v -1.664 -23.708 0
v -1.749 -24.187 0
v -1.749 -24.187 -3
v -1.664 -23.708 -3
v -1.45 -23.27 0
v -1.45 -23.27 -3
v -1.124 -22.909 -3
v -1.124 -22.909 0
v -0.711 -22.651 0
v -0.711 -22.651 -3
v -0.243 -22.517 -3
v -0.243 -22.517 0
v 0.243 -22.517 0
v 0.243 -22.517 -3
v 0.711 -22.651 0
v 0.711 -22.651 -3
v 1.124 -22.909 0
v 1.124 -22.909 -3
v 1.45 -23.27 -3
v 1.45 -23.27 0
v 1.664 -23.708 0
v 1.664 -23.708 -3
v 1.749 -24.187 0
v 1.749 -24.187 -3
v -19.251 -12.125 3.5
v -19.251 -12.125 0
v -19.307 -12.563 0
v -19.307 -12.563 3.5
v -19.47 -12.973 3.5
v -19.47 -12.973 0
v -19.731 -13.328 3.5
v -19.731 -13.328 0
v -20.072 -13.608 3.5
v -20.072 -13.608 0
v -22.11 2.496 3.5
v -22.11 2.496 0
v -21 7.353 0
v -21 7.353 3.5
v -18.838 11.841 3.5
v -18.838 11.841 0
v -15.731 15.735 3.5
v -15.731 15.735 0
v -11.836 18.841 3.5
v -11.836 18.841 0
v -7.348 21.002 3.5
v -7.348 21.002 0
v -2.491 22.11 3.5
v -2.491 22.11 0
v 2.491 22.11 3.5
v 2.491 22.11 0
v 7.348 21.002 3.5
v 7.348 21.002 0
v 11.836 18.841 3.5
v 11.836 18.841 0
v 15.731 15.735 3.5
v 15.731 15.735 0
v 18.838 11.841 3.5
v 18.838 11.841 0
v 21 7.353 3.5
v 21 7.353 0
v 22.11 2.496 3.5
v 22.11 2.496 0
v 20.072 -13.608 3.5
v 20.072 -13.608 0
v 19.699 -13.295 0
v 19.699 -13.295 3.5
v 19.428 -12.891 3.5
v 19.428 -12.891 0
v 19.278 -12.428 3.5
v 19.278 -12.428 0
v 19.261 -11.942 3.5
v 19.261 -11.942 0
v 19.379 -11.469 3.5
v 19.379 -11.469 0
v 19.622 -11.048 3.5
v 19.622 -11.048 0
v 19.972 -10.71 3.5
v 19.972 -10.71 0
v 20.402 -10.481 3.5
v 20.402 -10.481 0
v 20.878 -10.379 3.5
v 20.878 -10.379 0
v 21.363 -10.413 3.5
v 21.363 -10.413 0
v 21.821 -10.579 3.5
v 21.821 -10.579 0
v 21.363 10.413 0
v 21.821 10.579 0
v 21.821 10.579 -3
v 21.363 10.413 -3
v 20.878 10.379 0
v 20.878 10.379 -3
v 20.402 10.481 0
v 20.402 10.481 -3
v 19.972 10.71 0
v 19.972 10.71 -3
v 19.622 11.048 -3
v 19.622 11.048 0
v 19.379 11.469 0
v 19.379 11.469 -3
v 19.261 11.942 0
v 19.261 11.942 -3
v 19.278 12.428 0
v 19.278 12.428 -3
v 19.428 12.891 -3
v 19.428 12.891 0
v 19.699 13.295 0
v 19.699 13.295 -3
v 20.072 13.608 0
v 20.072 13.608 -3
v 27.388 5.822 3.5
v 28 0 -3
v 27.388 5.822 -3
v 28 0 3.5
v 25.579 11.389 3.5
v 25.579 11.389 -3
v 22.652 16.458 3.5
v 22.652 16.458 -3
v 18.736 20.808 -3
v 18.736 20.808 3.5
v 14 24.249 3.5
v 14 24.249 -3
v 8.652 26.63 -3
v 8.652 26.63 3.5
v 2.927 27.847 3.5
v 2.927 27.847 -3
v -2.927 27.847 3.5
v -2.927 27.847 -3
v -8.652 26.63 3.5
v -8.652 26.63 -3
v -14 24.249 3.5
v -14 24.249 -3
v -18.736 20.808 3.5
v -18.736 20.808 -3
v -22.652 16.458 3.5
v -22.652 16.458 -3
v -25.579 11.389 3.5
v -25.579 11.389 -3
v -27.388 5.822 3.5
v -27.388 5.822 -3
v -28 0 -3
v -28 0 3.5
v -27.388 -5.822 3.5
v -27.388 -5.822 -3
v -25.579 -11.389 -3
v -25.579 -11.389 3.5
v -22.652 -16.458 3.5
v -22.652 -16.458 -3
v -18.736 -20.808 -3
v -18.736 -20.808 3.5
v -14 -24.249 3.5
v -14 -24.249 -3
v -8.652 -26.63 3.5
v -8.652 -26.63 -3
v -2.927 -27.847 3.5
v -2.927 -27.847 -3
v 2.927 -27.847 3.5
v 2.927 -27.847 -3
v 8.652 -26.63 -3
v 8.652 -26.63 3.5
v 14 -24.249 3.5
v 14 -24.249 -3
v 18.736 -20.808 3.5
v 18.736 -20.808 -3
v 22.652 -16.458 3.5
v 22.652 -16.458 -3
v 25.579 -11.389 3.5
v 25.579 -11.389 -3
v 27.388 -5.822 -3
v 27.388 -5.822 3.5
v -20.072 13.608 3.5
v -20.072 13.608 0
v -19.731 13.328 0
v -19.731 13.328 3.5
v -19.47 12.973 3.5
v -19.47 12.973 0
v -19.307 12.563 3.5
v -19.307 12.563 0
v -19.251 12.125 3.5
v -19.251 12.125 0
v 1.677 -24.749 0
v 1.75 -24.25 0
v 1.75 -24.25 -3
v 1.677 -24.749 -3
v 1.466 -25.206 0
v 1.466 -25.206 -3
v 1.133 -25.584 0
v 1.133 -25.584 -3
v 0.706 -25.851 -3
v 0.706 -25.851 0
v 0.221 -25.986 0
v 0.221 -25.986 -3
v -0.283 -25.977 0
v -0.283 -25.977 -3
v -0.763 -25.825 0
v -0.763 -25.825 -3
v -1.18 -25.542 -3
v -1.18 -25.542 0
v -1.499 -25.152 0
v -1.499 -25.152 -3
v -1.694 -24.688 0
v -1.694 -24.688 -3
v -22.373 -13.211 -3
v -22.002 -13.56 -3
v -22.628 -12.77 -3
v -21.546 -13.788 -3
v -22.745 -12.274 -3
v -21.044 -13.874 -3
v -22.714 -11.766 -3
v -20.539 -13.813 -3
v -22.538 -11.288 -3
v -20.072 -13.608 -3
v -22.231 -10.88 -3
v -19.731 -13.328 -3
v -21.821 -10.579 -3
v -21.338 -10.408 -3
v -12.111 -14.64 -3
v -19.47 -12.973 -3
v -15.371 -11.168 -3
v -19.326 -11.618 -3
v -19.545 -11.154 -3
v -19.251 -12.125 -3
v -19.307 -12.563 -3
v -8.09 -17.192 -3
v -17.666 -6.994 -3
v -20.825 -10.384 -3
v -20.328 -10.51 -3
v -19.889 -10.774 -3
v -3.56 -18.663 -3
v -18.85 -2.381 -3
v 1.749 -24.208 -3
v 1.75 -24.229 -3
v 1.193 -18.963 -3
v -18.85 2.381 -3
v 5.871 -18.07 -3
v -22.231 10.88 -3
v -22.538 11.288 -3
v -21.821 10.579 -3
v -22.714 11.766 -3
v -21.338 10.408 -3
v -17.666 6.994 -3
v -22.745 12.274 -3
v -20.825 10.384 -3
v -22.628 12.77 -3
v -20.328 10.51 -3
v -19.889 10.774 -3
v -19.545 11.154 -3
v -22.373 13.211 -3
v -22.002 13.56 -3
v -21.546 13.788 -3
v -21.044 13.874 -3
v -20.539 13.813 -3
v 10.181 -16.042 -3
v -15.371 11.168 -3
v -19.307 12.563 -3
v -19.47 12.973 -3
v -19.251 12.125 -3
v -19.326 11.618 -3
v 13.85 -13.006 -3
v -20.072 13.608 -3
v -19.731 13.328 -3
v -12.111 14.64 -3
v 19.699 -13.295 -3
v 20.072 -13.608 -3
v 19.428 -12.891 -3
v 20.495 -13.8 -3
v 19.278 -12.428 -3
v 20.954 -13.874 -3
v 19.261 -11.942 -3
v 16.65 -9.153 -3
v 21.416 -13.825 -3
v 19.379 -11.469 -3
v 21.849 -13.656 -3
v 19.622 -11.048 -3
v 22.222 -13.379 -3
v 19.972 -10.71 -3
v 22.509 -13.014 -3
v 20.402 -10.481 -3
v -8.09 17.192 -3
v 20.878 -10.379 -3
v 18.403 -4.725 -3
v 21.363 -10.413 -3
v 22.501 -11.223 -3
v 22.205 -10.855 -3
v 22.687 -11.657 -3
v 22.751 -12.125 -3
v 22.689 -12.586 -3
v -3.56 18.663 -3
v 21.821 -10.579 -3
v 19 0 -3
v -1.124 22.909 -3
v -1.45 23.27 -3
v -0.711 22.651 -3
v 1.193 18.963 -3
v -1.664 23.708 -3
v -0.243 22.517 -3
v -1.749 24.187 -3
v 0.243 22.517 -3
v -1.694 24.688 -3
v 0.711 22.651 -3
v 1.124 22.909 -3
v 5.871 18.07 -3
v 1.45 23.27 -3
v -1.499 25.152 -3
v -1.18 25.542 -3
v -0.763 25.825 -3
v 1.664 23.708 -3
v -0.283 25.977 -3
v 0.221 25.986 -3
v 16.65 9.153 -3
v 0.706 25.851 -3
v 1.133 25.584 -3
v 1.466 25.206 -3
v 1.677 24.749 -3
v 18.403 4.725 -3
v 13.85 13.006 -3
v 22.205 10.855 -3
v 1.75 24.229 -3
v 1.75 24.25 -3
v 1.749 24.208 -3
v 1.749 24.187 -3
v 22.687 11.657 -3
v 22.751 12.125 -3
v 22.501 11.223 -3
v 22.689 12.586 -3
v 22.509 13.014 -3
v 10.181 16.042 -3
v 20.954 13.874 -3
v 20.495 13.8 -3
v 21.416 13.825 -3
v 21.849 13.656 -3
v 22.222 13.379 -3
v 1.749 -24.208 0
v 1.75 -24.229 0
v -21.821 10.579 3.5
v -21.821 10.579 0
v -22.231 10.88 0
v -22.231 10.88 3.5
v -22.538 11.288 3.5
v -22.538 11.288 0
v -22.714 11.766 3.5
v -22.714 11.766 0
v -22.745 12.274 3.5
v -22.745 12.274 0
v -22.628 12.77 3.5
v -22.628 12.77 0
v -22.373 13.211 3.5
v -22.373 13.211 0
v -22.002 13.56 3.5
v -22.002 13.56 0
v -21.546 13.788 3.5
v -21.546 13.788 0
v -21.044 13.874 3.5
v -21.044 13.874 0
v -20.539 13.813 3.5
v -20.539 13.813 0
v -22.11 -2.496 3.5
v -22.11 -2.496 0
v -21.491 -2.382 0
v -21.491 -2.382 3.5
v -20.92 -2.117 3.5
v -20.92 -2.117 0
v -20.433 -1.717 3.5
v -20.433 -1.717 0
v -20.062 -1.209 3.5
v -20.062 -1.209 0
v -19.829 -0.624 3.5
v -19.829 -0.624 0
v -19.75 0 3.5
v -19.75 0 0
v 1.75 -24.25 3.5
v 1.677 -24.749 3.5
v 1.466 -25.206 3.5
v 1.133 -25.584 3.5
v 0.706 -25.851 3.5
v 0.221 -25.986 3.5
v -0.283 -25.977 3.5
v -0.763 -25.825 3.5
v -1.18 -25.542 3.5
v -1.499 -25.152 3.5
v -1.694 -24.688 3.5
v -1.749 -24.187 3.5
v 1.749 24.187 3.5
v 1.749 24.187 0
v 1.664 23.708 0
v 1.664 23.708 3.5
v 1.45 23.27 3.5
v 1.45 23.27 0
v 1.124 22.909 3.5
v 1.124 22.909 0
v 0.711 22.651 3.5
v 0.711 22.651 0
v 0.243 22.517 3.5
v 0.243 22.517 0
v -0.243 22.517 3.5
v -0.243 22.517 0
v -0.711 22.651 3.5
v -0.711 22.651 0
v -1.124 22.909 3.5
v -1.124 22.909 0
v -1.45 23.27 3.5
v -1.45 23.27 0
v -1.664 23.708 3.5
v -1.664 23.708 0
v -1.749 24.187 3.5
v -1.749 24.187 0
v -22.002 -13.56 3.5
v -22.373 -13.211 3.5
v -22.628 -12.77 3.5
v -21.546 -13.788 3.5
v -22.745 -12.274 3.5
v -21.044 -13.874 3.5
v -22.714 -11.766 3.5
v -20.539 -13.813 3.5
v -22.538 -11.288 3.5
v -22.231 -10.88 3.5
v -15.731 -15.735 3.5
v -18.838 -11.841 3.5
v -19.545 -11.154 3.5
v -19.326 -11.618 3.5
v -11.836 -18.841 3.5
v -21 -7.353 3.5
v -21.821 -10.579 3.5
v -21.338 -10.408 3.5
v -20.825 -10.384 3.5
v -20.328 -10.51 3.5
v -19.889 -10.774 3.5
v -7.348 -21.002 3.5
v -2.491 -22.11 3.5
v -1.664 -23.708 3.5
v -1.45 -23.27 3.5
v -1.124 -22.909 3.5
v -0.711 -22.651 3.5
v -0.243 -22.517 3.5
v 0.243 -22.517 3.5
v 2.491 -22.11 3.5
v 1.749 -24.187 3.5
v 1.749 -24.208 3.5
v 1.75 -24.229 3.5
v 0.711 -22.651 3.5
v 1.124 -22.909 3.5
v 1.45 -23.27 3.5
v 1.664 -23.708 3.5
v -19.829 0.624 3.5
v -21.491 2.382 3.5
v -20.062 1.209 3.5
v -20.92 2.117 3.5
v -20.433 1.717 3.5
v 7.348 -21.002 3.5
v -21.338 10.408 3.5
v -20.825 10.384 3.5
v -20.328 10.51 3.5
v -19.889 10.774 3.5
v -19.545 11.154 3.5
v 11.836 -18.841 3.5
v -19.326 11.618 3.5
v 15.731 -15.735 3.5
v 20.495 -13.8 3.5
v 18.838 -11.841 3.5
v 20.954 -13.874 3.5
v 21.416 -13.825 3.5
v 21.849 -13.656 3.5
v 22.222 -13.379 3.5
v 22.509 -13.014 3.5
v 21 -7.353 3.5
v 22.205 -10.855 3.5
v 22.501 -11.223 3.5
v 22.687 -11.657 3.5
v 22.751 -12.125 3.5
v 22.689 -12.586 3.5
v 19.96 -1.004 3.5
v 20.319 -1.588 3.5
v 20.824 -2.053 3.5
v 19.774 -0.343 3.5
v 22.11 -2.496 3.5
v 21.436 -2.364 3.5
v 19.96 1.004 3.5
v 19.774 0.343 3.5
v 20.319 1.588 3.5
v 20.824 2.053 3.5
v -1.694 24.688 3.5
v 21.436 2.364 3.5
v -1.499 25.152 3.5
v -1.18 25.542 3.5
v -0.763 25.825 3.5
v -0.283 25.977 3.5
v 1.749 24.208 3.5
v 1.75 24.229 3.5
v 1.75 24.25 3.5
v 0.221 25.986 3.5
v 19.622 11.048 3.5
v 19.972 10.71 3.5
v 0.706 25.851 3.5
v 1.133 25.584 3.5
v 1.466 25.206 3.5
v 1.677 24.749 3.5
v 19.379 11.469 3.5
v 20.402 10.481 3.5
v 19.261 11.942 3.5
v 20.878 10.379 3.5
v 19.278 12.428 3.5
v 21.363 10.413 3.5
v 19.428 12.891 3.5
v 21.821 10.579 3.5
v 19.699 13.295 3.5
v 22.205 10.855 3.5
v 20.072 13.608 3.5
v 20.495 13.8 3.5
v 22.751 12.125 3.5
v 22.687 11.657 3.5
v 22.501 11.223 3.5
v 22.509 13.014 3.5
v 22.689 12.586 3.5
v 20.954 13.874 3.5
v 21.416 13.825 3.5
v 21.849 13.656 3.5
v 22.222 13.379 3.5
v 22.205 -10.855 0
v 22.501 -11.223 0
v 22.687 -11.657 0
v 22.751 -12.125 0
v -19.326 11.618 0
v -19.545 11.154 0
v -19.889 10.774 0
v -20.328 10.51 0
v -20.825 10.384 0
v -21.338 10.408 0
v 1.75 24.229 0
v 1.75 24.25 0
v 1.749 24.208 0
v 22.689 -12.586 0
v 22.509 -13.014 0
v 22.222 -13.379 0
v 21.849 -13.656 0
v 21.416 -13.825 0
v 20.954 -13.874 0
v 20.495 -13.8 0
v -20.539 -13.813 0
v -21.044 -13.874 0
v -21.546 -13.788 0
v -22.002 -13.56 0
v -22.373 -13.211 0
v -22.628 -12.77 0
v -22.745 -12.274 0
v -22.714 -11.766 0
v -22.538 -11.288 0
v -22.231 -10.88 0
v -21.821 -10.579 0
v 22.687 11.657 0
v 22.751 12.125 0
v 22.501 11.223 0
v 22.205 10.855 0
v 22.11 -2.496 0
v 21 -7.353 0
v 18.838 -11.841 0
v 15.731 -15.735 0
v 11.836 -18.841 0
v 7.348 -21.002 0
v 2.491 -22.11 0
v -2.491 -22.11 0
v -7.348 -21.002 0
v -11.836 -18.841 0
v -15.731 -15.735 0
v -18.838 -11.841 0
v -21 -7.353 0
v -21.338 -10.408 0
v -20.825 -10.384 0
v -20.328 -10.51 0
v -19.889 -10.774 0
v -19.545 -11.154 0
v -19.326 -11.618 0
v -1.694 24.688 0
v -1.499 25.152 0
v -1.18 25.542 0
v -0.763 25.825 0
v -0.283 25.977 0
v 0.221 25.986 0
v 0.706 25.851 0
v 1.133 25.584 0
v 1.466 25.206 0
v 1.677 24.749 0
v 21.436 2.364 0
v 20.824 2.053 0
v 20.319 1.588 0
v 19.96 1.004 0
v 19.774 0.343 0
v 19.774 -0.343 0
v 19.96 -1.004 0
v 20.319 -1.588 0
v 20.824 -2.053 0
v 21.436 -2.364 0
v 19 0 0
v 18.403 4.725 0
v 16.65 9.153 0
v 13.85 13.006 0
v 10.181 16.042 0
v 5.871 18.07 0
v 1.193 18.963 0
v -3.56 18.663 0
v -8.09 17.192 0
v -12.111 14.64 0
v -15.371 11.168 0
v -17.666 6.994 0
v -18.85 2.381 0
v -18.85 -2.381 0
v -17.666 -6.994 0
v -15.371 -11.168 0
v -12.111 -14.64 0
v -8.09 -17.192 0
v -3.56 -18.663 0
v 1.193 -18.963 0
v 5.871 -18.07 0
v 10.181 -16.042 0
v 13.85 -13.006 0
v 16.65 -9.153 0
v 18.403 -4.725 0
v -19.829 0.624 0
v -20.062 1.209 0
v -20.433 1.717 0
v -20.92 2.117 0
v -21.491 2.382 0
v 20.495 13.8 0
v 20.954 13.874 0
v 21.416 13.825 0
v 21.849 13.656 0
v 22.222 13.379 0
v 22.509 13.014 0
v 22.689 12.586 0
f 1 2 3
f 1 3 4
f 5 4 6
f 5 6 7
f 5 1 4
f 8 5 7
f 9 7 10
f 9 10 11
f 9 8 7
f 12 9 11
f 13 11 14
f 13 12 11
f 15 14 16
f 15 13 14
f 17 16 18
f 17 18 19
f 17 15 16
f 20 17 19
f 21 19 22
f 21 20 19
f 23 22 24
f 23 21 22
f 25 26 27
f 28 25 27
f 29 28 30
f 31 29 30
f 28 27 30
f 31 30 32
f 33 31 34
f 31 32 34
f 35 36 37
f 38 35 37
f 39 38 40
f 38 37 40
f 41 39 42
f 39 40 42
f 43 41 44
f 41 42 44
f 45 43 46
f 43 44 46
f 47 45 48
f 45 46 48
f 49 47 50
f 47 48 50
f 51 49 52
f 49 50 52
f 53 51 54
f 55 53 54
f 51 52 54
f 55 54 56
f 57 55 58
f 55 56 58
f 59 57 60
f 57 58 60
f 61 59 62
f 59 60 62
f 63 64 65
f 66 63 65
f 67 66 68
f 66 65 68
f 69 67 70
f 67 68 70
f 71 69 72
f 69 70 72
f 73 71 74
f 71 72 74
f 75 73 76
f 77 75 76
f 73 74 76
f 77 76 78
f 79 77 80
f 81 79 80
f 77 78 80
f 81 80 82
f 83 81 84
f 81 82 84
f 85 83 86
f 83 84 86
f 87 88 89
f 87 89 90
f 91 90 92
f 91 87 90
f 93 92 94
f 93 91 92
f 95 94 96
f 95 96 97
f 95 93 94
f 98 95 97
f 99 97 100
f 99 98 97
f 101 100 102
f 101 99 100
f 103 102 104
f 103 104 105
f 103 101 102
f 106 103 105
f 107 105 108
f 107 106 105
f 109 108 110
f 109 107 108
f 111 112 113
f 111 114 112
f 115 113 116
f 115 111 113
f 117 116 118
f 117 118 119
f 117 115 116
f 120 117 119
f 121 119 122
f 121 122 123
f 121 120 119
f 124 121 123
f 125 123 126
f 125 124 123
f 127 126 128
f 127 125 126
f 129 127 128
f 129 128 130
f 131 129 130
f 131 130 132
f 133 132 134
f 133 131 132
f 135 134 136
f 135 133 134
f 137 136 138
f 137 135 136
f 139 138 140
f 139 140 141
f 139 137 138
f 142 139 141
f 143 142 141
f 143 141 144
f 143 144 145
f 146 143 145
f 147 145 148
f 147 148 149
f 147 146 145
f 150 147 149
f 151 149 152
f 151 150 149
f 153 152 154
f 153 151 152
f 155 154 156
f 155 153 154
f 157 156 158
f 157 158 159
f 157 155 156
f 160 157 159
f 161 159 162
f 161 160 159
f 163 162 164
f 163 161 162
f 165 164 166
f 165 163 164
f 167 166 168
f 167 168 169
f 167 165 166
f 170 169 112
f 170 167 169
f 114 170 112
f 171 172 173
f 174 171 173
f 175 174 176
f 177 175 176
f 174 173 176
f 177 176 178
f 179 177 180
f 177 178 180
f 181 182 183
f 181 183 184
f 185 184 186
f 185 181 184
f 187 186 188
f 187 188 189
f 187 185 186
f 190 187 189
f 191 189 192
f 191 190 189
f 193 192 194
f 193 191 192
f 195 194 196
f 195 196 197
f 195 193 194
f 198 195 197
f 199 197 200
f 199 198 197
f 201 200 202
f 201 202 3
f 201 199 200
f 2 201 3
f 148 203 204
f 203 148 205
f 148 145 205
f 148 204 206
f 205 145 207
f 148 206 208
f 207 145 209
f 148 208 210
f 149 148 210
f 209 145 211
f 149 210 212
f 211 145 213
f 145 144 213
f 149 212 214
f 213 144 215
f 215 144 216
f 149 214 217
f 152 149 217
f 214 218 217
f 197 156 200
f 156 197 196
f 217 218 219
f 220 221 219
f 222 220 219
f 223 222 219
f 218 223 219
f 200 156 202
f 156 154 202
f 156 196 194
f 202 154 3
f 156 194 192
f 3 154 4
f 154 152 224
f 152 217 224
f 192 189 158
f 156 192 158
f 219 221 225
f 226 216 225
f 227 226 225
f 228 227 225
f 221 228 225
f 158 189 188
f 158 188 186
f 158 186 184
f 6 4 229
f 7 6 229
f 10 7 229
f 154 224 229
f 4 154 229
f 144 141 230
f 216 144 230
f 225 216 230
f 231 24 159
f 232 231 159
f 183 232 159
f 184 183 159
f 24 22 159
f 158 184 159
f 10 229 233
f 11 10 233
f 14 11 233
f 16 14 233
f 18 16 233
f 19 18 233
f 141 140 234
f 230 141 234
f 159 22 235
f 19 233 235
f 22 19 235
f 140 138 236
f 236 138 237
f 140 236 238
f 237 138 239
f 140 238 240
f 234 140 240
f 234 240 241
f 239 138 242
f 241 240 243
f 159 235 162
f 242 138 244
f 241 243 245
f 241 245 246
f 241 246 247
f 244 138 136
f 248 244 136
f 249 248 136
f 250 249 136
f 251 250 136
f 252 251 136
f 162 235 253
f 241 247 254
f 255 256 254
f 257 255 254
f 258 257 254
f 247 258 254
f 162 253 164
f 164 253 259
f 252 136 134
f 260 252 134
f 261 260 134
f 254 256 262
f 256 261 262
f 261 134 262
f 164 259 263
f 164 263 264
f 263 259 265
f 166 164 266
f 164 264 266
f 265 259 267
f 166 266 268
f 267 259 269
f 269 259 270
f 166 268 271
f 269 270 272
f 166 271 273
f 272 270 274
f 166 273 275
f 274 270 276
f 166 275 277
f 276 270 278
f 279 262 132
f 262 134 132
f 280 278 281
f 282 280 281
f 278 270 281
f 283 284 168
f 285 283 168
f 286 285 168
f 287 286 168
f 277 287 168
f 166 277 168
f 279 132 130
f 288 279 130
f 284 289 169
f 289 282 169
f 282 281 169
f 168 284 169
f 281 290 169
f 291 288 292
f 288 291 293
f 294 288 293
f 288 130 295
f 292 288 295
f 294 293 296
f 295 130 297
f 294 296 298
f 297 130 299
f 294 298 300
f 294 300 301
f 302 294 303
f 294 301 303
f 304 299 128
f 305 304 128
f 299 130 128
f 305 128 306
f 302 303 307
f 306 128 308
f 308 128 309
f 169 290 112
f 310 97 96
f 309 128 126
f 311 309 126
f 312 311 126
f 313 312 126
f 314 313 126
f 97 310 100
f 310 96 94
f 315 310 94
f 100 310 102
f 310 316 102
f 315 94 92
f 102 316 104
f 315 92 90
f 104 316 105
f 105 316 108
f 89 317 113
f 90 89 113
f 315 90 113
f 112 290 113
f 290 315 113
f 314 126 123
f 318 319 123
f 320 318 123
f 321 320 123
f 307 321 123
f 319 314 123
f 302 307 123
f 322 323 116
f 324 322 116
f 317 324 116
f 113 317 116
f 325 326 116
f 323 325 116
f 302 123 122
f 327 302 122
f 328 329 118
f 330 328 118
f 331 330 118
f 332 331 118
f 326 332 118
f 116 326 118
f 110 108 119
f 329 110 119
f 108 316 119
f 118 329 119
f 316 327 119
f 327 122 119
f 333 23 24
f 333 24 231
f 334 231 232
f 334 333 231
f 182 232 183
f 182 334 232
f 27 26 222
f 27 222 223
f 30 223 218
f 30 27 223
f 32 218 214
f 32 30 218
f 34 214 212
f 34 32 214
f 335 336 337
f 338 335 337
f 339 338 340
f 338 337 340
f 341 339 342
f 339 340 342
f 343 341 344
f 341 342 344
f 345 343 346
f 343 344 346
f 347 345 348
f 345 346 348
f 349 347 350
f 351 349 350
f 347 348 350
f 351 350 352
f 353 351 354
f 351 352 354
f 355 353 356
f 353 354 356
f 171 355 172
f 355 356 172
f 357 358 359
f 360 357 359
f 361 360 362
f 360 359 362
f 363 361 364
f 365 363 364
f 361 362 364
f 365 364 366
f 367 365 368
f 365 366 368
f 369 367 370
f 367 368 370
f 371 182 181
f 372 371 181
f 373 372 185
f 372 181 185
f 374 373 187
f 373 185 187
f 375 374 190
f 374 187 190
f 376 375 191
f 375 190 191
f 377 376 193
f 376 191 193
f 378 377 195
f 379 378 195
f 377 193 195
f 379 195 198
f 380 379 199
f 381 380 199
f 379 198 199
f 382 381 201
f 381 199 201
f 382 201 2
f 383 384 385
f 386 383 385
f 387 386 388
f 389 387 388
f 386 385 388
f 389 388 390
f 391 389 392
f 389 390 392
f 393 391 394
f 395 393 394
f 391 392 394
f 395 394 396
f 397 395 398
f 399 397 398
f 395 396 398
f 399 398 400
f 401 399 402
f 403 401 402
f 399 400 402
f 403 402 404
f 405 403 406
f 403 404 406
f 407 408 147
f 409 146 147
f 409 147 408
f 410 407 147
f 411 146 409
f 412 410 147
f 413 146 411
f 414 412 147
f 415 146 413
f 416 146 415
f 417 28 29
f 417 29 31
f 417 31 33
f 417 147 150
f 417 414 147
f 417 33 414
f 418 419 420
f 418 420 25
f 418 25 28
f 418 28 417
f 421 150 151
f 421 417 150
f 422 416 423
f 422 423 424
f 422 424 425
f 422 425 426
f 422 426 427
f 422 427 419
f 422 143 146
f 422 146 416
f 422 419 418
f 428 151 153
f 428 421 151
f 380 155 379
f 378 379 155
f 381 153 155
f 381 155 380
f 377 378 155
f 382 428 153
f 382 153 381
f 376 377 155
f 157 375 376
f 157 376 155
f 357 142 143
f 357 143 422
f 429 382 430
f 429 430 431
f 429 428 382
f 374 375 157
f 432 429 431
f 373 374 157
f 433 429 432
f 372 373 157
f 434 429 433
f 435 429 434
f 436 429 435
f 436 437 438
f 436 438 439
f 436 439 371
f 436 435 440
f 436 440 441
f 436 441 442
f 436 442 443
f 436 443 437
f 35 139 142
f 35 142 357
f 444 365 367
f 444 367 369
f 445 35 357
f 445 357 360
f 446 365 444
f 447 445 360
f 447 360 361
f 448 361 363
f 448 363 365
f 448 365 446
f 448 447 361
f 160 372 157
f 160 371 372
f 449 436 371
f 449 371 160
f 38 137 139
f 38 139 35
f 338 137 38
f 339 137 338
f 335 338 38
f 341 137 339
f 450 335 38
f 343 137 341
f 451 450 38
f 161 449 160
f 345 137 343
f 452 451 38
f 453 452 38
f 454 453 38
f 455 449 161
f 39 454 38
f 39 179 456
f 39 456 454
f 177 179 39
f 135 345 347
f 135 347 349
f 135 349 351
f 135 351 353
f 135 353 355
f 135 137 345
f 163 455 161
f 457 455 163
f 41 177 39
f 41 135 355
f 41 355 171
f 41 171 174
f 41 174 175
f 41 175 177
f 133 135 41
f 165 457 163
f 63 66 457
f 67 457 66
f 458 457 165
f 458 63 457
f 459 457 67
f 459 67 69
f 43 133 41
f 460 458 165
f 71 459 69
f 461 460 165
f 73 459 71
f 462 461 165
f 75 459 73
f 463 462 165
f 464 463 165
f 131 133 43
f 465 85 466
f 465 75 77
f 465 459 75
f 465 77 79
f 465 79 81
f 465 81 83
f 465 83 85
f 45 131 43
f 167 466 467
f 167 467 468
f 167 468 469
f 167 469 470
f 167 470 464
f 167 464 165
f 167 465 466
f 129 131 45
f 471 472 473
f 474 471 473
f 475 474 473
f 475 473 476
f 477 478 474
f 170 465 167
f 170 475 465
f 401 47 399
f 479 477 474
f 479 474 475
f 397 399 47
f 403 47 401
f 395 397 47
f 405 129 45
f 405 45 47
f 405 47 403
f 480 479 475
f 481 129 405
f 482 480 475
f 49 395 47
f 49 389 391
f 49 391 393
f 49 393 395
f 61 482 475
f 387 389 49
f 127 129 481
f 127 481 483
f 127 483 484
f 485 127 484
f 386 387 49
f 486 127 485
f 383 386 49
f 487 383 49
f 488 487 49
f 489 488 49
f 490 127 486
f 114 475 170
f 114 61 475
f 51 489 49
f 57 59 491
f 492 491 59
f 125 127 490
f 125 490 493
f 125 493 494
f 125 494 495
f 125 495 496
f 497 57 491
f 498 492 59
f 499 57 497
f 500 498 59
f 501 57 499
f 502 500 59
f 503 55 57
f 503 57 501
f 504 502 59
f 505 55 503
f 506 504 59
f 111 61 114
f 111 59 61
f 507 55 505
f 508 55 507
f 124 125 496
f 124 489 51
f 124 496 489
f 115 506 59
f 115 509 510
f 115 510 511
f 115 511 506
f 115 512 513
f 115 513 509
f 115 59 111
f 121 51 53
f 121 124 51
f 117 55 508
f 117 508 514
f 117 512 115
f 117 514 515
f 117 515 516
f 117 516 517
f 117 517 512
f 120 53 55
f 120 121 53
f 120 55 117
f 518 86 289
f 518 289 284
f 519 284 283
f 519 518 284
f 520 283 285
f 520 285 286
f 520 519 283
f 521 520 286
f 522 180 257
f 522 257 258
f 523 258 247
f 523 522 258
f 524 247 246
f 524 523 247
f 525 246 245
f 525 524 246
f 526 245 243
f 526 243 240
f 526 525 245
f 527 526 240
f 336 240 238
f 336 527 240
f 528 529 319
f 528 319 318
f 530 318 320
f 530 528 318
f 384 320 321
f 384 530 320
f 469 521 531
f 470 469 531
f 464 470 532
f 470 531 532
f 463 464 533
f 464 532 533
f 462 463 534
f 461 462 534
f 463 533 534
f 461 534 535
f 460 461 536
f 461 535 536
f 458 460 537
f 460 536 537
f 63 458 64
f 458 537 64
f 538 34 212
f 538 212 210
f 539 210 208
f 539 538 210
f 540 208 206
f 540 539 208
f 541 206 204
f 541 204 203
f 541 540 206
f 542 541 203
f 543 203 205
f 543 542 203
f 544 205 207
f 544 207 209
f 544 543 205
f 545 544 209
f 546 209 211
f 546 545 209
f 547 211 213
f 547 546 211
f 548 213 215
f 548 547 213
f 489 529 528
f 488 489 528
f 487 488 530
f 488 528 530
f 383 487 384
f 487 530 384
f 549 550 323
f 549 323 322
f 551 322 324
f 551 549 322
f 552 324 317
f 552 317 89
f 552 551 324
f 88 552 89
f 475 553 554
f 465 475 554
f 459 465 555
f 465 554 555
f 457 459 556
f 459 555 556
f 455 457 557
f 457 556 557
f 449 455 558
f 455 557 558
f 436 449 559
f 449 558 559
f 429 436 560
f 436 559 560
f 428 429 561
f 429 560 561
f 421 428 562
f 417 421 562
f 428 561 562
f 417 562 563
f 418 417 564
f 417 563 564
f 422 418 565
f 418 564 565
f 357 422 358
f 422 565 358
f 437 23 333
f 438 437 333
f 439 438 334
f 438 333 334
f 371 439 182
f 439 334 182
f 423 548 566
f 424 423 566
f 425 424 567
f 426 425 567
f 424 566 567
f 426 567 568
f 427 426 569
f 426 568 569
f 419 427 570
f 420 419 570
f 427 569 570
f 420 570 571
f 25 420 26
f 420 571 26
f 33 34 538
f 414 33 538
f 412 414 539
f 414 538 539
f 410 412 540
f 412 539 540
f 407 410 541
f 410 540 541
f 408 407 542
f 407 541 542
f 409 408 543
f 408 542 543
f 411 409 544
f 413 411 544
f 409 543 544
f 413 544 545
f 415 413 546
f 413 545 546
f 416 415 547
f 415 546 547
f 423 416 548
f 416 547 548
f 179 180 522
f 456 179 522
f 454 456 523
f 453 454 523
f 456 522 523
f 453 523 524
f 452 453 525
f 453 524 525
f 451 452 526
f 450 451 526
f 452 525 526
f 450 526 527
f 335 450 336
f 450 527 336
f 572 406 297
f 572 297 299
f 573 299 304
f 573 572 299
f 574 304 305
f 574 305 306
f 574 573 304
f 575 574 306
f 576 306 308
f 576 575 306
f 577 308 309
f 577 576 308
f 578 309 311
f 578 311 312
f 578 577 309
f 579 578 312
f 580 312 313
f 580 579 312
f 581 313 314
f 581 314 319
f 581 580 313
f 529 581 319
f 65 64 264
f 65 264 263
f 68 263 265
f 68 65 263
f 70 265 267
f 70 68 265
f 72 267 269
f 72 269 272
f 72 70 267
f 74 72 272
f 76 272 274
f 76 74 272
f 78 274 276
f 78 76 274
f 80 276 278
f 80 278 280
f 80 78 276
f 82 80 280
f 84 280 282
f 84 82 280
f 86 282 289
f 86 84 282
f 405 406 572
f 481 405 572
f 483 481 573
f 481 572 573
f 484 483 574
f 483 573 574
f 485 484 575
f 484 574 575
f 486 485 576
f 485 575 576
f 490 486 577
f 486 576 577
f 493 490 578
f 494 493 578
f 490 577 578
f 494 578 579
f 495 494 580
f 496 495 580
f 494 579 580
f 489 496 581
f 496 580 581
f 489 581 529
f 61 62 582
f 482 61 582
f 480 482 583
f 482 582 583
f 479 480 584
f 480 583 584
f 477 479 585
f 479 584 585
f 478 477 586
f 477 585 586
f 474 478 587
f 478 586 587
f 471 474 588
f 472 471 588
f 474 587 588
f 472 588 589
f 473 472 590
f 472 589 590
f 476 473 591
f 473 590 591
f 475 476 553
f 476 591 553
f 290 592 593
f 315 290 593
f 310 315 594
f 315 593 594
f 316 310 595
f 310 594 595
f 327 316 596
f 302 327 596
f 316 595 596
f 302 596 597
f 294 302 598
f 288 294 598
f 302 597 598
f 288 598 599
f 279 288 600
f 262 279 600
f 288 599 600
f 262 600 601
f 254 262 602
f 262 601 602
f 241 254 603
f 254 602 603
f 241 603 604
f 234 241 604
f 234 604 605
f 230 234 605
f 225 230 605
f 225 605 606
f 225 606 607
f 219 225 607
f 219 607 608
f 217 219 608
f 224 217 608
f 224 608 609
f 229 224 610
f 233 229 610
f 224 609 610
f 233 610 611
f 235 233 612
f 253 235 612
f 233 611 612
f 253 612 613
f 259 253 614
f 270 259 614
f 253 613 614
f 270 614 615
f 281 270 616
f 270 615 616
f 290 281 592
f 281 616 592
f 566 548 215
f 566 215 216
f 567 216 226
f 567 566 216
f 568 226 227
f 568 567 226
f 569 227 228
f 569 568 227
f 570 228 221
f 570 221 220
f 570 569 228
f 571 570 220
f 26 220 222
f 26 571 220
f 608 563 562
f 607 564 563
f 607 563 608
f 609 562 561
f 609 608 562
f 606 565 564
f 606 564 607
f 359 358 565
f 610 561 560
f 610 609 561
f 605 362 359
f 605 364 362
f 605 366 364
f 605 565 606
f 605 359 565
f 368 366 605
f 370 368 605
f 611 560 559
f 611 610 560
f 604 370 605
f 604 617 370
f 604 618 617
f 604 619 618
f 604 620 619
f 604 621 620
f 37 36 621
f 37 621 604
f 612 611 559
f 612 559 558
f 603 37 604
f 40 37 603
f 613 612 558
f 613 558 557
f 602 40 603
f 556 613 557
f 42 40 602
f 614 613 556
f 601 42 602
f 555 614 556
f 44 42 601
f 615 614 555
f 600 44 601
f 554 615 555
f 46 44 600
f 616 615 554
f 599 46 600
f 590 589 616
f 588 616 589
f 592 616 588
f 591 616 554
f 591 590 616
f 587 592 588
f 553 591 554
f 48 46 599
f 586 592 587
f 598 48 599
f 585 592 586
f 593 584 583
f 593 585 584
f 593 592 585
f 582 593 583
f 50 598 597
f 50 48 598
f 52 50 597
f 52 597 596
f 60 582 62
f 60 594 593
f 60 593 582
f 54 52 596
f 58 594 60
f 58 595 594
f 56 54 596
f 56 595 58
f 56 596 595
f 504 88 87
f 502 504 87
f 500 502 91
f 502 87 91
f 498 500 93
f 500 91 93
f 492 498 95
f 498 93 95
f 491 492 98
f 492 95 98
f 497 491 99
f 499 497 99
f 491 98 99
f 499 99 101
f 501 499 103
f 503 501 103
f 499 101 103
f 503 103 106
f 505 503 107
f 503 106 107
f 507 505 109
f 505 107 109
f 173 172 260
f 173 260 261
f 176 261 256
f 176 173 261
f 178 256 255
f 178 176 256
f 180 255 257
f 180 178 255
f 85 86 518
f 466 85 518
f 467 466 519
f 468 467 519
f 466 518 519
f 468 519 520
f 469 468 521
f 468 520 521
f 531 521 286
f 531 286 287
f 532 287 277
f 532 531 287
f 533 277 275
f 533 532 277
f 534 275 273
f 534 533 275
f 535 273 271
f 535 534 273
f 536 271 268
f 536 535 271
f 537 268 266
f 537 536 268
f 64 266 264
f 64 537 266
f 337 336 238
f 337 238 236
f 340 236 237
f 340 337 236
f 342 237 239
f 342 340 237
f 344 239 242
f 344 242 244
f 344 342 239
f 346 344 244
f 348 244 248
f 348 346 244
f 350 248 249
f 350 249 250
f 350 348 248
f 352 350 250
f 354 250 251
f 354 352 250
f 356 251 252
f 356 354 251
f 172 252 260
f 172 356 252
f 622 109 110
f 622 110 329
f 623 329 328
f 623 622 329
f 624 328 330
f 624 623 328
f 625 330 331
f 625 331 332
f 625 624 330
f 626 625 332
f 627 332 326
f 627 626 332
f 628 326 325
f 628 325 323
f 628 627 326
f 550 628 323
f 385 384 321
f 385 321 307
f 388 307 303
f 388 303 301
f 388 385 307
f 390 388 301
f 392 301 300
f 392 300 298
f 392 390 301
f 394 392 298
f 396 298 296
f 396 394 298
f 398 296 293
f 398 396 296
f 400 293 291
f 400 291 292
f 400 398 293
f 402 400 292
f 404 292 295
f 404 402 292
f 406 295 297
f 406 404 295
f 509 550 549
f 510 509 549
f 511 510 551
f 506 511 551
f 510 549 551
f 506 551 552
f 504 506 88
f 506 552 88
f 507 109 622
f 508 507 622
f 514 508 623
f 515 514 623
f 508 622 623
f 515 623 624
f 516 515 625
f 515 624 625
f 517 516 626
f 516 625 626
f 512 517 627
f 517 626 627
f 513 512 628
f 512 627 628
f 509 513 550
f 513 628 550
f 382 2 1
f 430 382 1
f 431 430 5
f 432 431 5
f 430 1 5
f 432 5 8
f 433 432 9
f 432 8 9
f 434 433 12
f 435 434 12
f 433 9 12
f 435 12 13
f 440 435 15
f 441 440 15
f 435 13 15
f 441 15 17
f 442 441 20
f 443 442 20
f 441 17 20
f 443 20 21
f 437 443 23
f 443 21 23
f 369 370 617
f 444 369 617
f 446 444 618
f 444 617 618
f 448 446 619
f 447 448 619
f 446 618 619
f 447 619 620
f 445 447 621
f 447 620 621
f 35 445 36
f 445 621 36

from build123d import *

# Parameters (mm, degrees)
F0_R     = 28
F1_DEPTH = 3.5
F0_R_2   = 19
F2_DEPTH = 3


with BuildPart() as f1:
    # F0 (on Top) → F1 (new body)
    with BuildSketch(Plane.XY):
        Circle(F0_R)
        with BuildLine():
            ThreePointArc((21.8208616615, 10.5788702775), (23.4473621908, 6.1873828305), (24.1994382022, 1.5651487775))
            ThreePointArc((24.1994382022, 1.5651487775), (24.6083464022, 0.8295795605), (24.75, 0))
            ThreePointArc((24.75, 0), (24.6083464022, -0.8295795605), (24.1994382022, -1.5651487775))
            ThreePointArc((24.1994382022, -1.5651487775), (23.4473621908, -6.1873828305), (21.8208616615, -10.5788702775))
            ThreePointArc((21.8208616615, -10.5788702775), (22.5006251005, -11.222795709), (22.7511160418, -12.125))
            ThreePointArc((22.7511160418, -12.125), (21.8486268344, -13.6560863648), (20.0720012344, -13.6079853926))
            ThreePointArc((20.0720012344, -13.6079853926), (12.125, -21.0011160418), (1.7488604271, -24.1868556701))
            ThreePointArc((1.7488604271, -24.1868556701), (1.7497150836, -24.218422694), (1.75, -24.25))
            ThreePointArc((1.75, -24.25), (-0.031577306, -25.9997150836), (-1.7488604271, -24.1868556701))
            ThreePointArc((-1.7488604271, -24.1868556701), (-12.125, -21.0011160418), (-20.0720012344, -13.6079853926))
            ThreePointArc((-20.0720012344, -13.6079853926), (-22.5166604984, -13), (-21.8208616615, -10.5788702775))
            ThreePointArc((-21.8208616615, -10.5788702775), (-23.4473621908, -6.1873828305), (-24.1994382022, -1.5651487775))
            ThreePointArc((-24.1994382022, -1.5651487775), (-24.75, 0), (-24.1994382022, 1.5651487775))
            ThreePointArc((-24.1994382022, 1.5651487775), (-23.4473621908, 6.1873828305), (-21.8208616615, 10.5788702775))
            ThreePointArc((-21.8208616615, 10.5788702775), (-22.5166604984, 13), (-20.0720012344, 13.6079853926))
            ThreePointArc((-20.0720012344, 13.6079853926), (-12.125, 21.0011160418), (-1.7488604271, 24.1868556701))
            ThreePointArc((-1.7488604271, 24.1868556701), (-0.031577306, 25.9997150836), (1.75, 24.25))
            ThreePointArc((1.75, 24.25), (1.7497150836, 24.218422694), (1.7488604271, 24.1868556701))
            ThreePointArc((1.7488604271, 24.1868556701), (12.125, 21.0011160418), (20.0720012344, 13.6079853926))
            ThreePointArc((20.0720012344, 13.6079853926), (21.8486268344, 13.6560863648), (22.7511160418, 12.125))
            ThreePointArc((22.7511160418, 12.125), (22.5006251005, 11.222795709), (21.8208616615, 10.5788702775))
        make_face(mode=Mode.SUBTRACT)
        with BuildLine():
            ThreePointArc((22.1095505618, 2.4960516732), (23.267229147, 2.2836910611), (24.1994382022, 1.5651487775))
            ThreePointArc((24.1994382022, 1.5651487775), (23.4473621908, 6.1873828305), (21.8208616615, 10.5788702775))
            ThreePointArc((21.8208616615, 10.5788702775), (19.4855715851, 11.25), (20.0720012344, 13.6079853926))
            ThreePointArc((20.0720012344, 13.6079853926), (12.125, 21.0011160418), (1.7488604271, 24.1868556701))
            ThreePointArc((1.7488604271, 24.1868556701), (0, 22.5), (-1.7488604271, 24.1868556701))
            ThreePointArc((-1.7488604271, 24.1868556701), (-12.125, 21.0011160418), (-20.0720012344, 13.6079853926))
            ThreePointArc((-20.0720012344, 13.6079853926), (-19.470029677, 12.9725107926), (-19.2511160418, 12.125))
            ThreePointArc((-19.2511160418, 12.125), (-20.0989117508, 10.6254909412), (-21.8208616615, 10.5788702775))
            ThreePointArc((-21.8208616615, 10.5788702775), (-23.4473621908, 6.1873828305), (-24.1994382022, 1.5651487775))
            ThreePointArc((-24.1994382022, 1.5651487775), (-23.267229147, 2.2836910611), (-22.1095505618, 2.4960516732))
            ThreePointArc((-22.1095505618, 2.4960516732), (0, 22.25), (22.1095505618, 2.4960516732))
        make_face()
        with BuildLine():
            ThreePointArc((21.8208616615, -10.5788702775), (23.4473621908, -6.1873828305), (24.1994382022, -1.5651487775))
            ThreePointArc((24.1994382022, -1.5651487775), (23.267229147, -2.2836910611), (22.1095505618, -2.4960516732))
            ThreePointArc((22.1095505618, -2.4960516732), (0, -22.25), (-22.1095505618, -2.4960516732))
            ThreePointArc((-22.1095505618, -2.4960516732), (-23.267229147, -2.2836910611), (-24.1994382022, -1.5651487775))
            ThreePointArc((-24.1994382022, -1.5651487775), (-23.4473621908, -6.1873828305), (-21.8208616615, -10.5788702775))
            ThreePointArc((-21.8208616615, -10.5788702775), (-20.0989117508, -10.6254909412), (-19.2511160418, -12.125))
            ThreePointArc((-19.2511160418, -12.125), (-19.470029677, -12.9725107926), (-20.0720012344, -13.6079853926))
            ThreePointArc((-20.0720012344, -13.6079853926), (-12.125, -21.0011160418), (-1.7488604271, -24.1868556701))
            ThreePointArc((-1.7488604271, -24.1868556701), (0, -22.5), (1.7488604271, -24.1868556701))
            ThreePointArc((1.7488604271, -24.1868556701), (12.125, -21.0011160418), (20.0720012344, -13.6079853926))
            ThreePointArc((20.0720012344, -13.6079853926), (19.4855715851, -11.25), (21.8208616615, -10.5788702775))
        make_face()
        with BuildLine():
            ThreePointArc((22.25, 0), (22.2148598915, 1.25), (22.1095505618, 2.4960516732))
            ThreePointArc((22.1095505618, 2.4960516732), (19.75, 0), (22.1095505618, -2.4960516732))
            ThreePointArc((22.1095505618, -2.4960516732), (22.2148598915, -1.25), (22.25, 0))
        make_face()
        with BuildLine():
            ThreePointArc((-19.75, 0), (-20.4332551644, 1.7173928503), (-22.1095505618, 2.4960516732))
            ThreePointArc((-22.1095505618, 2.4960516732), (-22.25, 0), (-22.1095505618, -2.4960516732))
            ThreePointArc((-22.1095505618, -2.4960516732), (-20.4332551644, -1.7173928503), (-19.75, 0))
        make_face()
        with BuildLine():
            ThreePointArc((24.1994382022, -1.5651487775), (24.2373562544, -0.7829826293), (24.25, 0))
            ThreePointArc((24.25, 0), (24.2373562544, 0.7829826293), (24.1994382022, 1.5651487775))
            ThreePointArc((24.1994382022, 1.5651487775), (23.267229147, 2.2836910611), (22.1095505618, 2.4960516732))
            ThreePointArc((22.1095505618, 2.4960516732), (22.2148598915, 1.25), (22.25, 0))
            ThreePointArc((22.25, 0), (22.2148598915, -1.25), (22.1095505618, -2.4960516732))
            ThreePointArc((22.1095505618, -2.4960516732), (23.267229147, -2.2836910611), (24.1994382022, -1.5651487775))
        make_face()
        with BuildLine():
            ThreePointArc((-22.1095505618, -2.4960516732), (-22.25, 0), (-22.1095505618, 2.4960516732))
            ThreePointArc((-22.1095505618, 2.4960516732), (-23.267229147, 2.2836910611), (-24.1994382022, 1.5651487775))
            ThreePointArc((-24.1994382022, 1.5651487775), (-24.25, 0), (-24.1994382022, -1.5651487775))
            ThreePointArc((-24.1994382022, -1.5651487775), (-23.267229147, -2.2836910611), (-22.1095505618, -2.4960516732))
        make_face()
        with BuildLine():
            ThreePointArc((24.1994382022, 1.5651487775), (24.2373562544, 0.7829826293), (24.25, 0))
            ThreePointArc((24.25, 0), (24.2373562544, -0.7829826293), (24.1994382022, -1.5651487775))
            ThreePointArc((24.1994382022, -1.5651487775), (24.6083464022, -0.8295795605), (24.75, 0))
            ThreePointArc((24.75, 0), (24.6083464022, 0.8295795605), (24.1994382022, 1.5651487775))
        make_face()
        with BuildLine():
            ThreePointArc((-24.1994382022, -1.5651487775), (-24.25, 0), (-24.1994382022, 1.5651487775))
            ThreePointArc((-24.1994382022, 1.5651487775), (-24.75, 0), (-24.1994382022, -1.5651487775))
        make_face()
    extrude(amount=F1_DEPTH)

    # F0 (on Top) → F2 (join)
    with BuildSketch(Plane.XY):
        Circle(F0_R)
        with BuildLine():
            ThreePointArc((21.8208616615, 10.5788702775), (23.4473621908, 6.1873828305), (24.1994382022, 1.5651487775))
            ThreePointArc((24.1994382022, 1.5651487775), (24.6083464022, 0.8295795605), (24.75, 0))
            ThreePointArc((24.75, 0), (24.6083464022, -0.8295795605), (24.1994382022, -1.5651487775))
            ThreePointArc((24.1994382022, -1.5651487775), (23.4473621908, -6.1873828305), (21.8208616615, -10.5788702775))
            ThreePointArc((21.8208616615, -10.5788702775), (22.5006251005, -11.222795709), (22.7511160418, -12.125))
            ThreePointArc((22.7511160418, -12.125), (21.8486268344, -13.6560863648), (20.0720012344, -13.6079853926))
            ThreePointArc((20.0720012344, -13.6079853926), (12.125, -21.0011160418), (1.7488604271, -24.1868556701))
            ThreePointArc((1.7488604271, -24.1868556701), (1.7497150836, -24.218422694), (1.75, -24.25))
            ThreePointArc((1.75, -24.25), (-0.031577306, -25.9997150836), (-1.7488604271, -24.1868556701))
            ThreePointArc((-1.7488604271, -24.1868556701), (-12.125, -21.0011160418), (-20.0720012344, -13.6079853926))
            ThreePointArc((-20.0720012344, -13.6079853926), (-22.5166604984, -13), (-21.8208616615, -10.5788702775))
            ThreePointArc((-21.8208616615, -10.5788702775), (-23.4473621908, -6.1873828305), (-24.1994382022, -1.5651487775))
            ThreePointArc((-24.1994382022, -1.5651487775), (-24.75, 0), (-24.1994382022, 1.5651487775))
            ThreePointArc((-24.1994382022, 1.5651487775), (-23.4473621908, 6.1873828305), (-21.8208616615, 10.5788702775))
            ThreePointArc((-21.8208616615, 10.5788702775), (-22.5166604984, 13), (-20.0720012344, 13.6079853926))
            ThreePointArc((-20.0720012344, 13.6079853926), (-12.125, 21.0011160418), (-1.7488604271, 24.1868556701))
            ThreePointArc((-1.7488604271, 24.1868556701), (-0.031577306, 25.9997150836), (1.75, 24.25))
            ThreePointArc((1.75, 24.25), (1.7497150836, 24.218422694), (1.7488604271, 24.1868556701))
            ThreePointArc((1.7488604271, 24.1868556701), (12.125, 21.0011160418), (20.0720012344, 13.6079853926))
            ThreePointArc((20.0720012344, 13.6079853926), (21.8486268344, 13.6560863648), (22.7511160418, 12.125))
            ThreePointArc((22.7511160418, 12.125), (22.5006251005, 11.222795709), (21.8208616615, 10.5788702775))
        make_face(mode=Mode.SUBTRACT)
        with BuildLine():
            ThreePointArc((22.1095505618, -2.4960516732), (19.75, 0), (22.1095505618, 2.4960516732))
            ThreePointArc((22.1095505618, 2.4960516732), (0, 22.25), (-22.1095505618, 2.4960516732))
            ThreePointArc((-22.1095505618, 2.4960516732), (-20.4332551644, 1.7173928503), (-19.75, 0))
            ThreePointArc((-19.75, 0), (-20.4332551644, -1.7173928503), (-22.1095505618, -2.4960516732))
            ThreePointArc((-22.1095505618, -2.4960516732), (0, -22.25), (22.1095505618, -2.4960516732))
        make_face()
        Circle(F0_R_2, mode=Mode.SUBTRACT)
        with BuildLine():
            ThreePointArc((22.1095505618, 2.4960516732), (23.267229147, 2.2836910611), (24.1994382022, 1.5651487775))
            ThreePointArc((24.1994382022, 1.5651487775), (23.4473621908, 6.1873828305), (21.8208616615, 10.5788702775))
            ThreePointArc((21.8208616615, 10.5788702775), (19.4855715851, 11.25), (20.0720012344, 13.6079853926))
            ThreePointArc((20.0720012344, 13.6079853926), (12.125, 21.0011160418), (1.7488604271, 24.1868556701))
            ThreePointArc((1.7488604271, 24.1868556701), (0, 22.5), (-1.7488604271, 24.1868556701))
            ThreePointArc((-1.7488604271, 24.1868556701), (-12.125, 21.0011160418), (-20.0720012344, 13.6079853926))
            ThreePointArc((-20.0720012344, 13.6079853926), (-19.470029677, 12.9725107926), (-19.2511160418, 12.125))
            ThreePointArc((-19.2511160418, 12.125), (-20.0989117508, 10.6254909412), (-21.8208616615, 10.5788702775))
            ThreePointArc((-21.8208616615, 10.5788702775), (-23.4473621908, 6.1873828305), (-24.1994382022, 1.5651487775))
            ThreePointArc((-24.1994382022, 1.5651487775), (-23.267229147, 2.2836910611), (-22.1095505618, 2.4960516732))
            ThreePointArc((-22.1095505618, 2.4960516732), (0, 22.25), (22.1095505618, 2.4960516732))
        make_face()
        with BuildLine():
            ThreePointArc((21.8208616615, -10.5788702775), (23.4473621908, -6.1873828305), (24.1994382022, -1.5651487775))
            ThreePointArc((24.1994382022, -1.5651487775), (23.267229147, -2.2836910611), (22.1095505618, -2.4960516732))
            ThreePointArc((22.1095505618, -2.4960516732), (0, -22.25), (-22.1095505618, -2.4960516732))
            ThreePointArc((-22.1095505618, -2.4960516732), (-23.267229147, -2.2836910611), (-24.1994382022, -1.5651487775))
            ThreePointArc((-24.1994382022, -1.5651487775), (-23.4473621908, -6.1873828305), (-21.8208616615, -10.5788702775))
            ThreePointArc((-21.8208616615, -10.5788702775), (-20.0989117508, -10.6254909412), (-19.2511160418, -12.125))
            ThreePointArc((-19.2511160418, -12.125), (-19.470029677, -12.9725107926), (-20.0720012344, -13.6079853926))
            ThreePointArc((-20.0720012344, -13.6079853926), (-12.125, -21.0011160418), (-1.7488604271, -24.1868556701))
            ThreePointArc((-1.7488604271, -24.1868556701), (0, -22.5), (1.7488604271, -24.1868556701))
            ThreePointArc((1.7488604271, -24.1868556701), (12.125, -21.0011160418), (20.0720012344, -13.6079853926))
            ThreePointArc((20.0720012344, -13.6079853926), (19.4855715851, -11.25), (21.8208616615, -10.5788702775))
        make_face()
        with BuildLine():
            ThreePointArc((22.25, 0), (22.2148598915, 1.25), (22.1095505618, 2.4960516732))
            ThreePointArc((22.1095505618, 2.4960516732), (19.75, 0), (22.1095505618, -2.4960516732))
            ThreePointArc((22.1095505618, -2.4960516732), (22.2148598915, -1.25), (22.25, 0))
        make_face()
        with BuildLine():
            ThreePointArc((-19.75, 0), (-20.4332551644, 1.7173928503), (-22.1095505618, 2.4960516732))
            ThreePointArc((-22.1095505618, 2.4960516732), (-22.25, 0), (-22.1095505618, -2.4960516732))
            ThreePointArc((-22.1095505618, -2.4960516732), (-20.4332551644, -1.7173928503), (-19.75, 0))
        make_face()
        with BuildLine():
            ThreePointArc((24.1994382022, -1.5651487775), (24.2373562544, -0.7829826293), (24.25, 0))
            ThreePointArc((24.25, 0), (24.2373562544, 0.7829826293), (24.1994382022, 1.5651487775))
            ThreePointArc((24.1994382022, 1.5651487775), (23.267229147, 2.2836910611), (22.1095505618, 2.4960516732))
            ThreePointArc((22.1095505618, 2.4960516732), (22.2148598915, 1.25), (22.25, 0))
            ThreePointArc((22.25, 0), (22.2148598915, -1.25), (22.1095505618, -2.4960516732))
            ThreePointArc((22.1095505618, -2.4960516732), (23.267229147, -2.2836910611), (24.1994382022, -1.5651487775))
        make_face()
        with BuildLine():
            ThreePointArc((-22.1095505618, -2.4960516732), (-22.25, 0), (-22.1095505618, 2.4960516732))
            ThreePointArc((-22.1095505618, 2.4960516732), (-23.267229147, 2.2836910611), (-24.1994382022, 1.5651487775))
            ThreePointArc((-24.1994382022, 1.5651487775), (-24.25, 0), (-24.1994382022, -1.5651487775))
            ThreePointArc((-24.1994382022, -1.5651487775), (-23.267229147, -2.2836910611), (-22.1095505618, -2.4960516732))
        make_face()
        with BuildLine():
            ThreePointArc((24.1994382022, 1.5651487775), (24.2373562544, 0.7829826293), (24.25, 0))
            ThreePointArc((24.25, 0), (24.2373562544, -0.7829826293), (24.1994382022, -1.5651487775))
            ThreePointArc((24.1994382022, -1.5651487775), (24.6083464022, -0.8295795605), (24.75, 0))
            ThreePointArc((24.75, 0), (24.6083464022, 0.8295795605), (24.1994382022, 1.5651487775))
        make_face()
        with BuildLine():
            ThreePointArc((-24.1994382022, -1.5651487775), (-24.25, 0), (-24.1994382022, 1.5651487775))
            ThreePointArc((-24.1994382022, 1.5651487775), (-24.75, 0), (-24.1994382022, -1.5651487775))
        make_face()
    extrude(amount=-F2_DEPTH)


solid = f1.part
